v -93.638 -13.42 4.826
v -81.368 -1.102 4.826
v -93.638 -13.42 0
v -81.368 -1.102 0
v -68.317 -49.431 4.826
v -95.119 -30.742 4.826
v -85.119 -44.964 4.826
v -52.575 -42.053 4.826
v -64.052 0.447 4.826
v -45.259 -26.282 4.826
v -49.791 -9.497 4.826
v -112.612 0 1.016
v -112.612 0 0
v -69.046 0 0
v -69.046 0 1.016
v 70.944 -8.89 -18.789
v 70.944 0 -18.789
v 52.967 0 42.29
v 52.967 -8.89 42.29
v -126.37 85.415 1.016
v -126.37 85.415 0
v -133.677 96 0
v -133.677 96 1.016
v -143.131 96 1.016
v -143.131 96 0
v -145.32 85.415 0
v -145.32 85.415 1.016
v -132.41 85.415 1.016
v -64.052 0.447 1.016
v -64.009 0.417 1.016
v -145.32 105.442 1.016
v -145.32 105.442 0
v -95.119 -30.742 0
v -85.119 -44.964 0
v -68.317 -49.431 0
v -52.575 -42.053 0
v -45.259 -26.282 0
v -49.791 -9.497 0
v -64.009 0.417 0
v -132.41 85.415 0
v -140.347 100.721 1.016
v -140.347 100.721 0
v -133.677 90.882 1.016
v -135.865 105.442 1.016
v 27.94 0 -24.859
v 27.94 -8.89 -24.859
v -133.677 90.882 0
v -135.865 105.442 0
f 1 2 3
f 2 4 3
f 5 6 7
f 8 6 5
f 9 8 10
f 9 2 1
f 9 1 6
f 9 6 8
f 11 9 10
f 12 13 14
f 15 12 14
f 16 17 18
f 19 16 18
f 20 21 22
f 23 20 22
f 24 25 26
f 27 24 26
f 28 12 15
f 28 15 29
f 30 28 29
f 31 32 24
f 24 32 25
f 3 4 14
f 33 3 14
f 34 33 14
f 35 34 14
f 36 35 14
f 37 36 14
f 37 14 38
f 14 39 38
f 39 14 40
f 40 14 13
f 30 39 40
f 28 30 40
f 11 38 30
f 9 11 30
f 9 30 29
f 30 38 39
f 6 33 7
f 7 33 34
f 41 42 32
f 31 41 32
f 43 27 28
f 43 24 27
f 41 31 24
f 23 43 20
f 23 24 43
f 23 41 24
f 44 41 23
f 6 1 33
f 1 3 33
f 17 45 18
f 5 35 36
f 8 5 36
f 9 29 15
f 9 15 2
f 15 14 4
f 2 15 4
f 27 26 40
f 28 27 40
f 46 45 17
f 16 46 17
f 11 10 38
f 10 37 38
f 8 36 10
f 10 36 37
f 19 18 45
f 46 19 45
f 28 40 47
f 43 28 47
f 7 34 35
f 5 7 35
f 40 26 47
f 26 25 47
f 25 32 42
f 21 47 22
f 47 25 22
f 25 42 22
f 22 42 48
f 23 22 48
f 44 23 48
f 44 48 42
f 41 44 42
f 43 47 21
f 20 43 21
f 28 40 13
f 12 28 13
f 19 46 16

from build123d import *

# Parameters (mm, degrees)
F1_DEPTH = 2.794
F3_DEPTH = 2.032
F6_DEPTH = 1.016
F8_DEPTH = 8.89


# Not quite as in the source:
# - the program builds the solid bodies; features that only make, move or delete a surface that nothing else refers to are left out


with BuildPart() as f1:
    # F0 (on Top) → F1 (new body)
    with BuildSketch(Plane.XY):
        Polygon((-52.5751584309, -42.0525174268), (-45.2585345965, -26.281562852), (-49.7910497594, -9.4972755918), (-64.0518897016, 0.4467898081), (-81.3682489225, -1.1023053687), (-93.6376104928, -13.4197222729), (-95.119003775, -30.7420046421), (-85.1192683885, -44.9638640401), (-68.3173916553, -49.4307343961), align=None)
    extrude(amount=F1_DEPTH)

    # F3 (add): a face of the model
    f3_faces = [f1.faces().sort_by_distance(p)[0] for p in [
        (-70.5820173025, -24.1159107536, 2.794),
    ]]
    extrude(f3_faces, amount=F3_DEPTH)

    # F5 (on Top) → F6 (join)
    with BuildSketch(Plane.XY):
        Polygon((-132.4096173048, 85.4147747159), (-112.612426281, 0), (-63.6733919382, 0), align=None)
    extrude(amount=F6_DEPTH)

    # F5 (on Top) → F6, piece 2 (join)
    with BuildSketch(Plane.XY):
        Polygon((-145.3195103792, 85.4147747159), (-132.4096173048, 85.4147747159), (-133.6767779322, 90.88192606), (-126.3700127602, 85.4147747159), (-133.6767779322, 96.0004851222), (-135.8651248663, 105.4420852036), (-140.3465569019, 100.7212851629), (-145.3195103792, 105.4420852036), (-143.131163445, 96.0004851222), align=None)
    extrude(amount=F6_DEPTH)


with BuildPart() as f8:
    # F7 (on Front) → F8 (new body)
    with BuildSketch(Plane.XZ):
        Polygon((52.9666729271, 42.2895699739), (27.9397200793, -24.8587857932), (70.943787694, -18.7894441187), align=None)
    extrude(amount=F8_DEPTH)


solid = Compound([f1.part, f8.part])
